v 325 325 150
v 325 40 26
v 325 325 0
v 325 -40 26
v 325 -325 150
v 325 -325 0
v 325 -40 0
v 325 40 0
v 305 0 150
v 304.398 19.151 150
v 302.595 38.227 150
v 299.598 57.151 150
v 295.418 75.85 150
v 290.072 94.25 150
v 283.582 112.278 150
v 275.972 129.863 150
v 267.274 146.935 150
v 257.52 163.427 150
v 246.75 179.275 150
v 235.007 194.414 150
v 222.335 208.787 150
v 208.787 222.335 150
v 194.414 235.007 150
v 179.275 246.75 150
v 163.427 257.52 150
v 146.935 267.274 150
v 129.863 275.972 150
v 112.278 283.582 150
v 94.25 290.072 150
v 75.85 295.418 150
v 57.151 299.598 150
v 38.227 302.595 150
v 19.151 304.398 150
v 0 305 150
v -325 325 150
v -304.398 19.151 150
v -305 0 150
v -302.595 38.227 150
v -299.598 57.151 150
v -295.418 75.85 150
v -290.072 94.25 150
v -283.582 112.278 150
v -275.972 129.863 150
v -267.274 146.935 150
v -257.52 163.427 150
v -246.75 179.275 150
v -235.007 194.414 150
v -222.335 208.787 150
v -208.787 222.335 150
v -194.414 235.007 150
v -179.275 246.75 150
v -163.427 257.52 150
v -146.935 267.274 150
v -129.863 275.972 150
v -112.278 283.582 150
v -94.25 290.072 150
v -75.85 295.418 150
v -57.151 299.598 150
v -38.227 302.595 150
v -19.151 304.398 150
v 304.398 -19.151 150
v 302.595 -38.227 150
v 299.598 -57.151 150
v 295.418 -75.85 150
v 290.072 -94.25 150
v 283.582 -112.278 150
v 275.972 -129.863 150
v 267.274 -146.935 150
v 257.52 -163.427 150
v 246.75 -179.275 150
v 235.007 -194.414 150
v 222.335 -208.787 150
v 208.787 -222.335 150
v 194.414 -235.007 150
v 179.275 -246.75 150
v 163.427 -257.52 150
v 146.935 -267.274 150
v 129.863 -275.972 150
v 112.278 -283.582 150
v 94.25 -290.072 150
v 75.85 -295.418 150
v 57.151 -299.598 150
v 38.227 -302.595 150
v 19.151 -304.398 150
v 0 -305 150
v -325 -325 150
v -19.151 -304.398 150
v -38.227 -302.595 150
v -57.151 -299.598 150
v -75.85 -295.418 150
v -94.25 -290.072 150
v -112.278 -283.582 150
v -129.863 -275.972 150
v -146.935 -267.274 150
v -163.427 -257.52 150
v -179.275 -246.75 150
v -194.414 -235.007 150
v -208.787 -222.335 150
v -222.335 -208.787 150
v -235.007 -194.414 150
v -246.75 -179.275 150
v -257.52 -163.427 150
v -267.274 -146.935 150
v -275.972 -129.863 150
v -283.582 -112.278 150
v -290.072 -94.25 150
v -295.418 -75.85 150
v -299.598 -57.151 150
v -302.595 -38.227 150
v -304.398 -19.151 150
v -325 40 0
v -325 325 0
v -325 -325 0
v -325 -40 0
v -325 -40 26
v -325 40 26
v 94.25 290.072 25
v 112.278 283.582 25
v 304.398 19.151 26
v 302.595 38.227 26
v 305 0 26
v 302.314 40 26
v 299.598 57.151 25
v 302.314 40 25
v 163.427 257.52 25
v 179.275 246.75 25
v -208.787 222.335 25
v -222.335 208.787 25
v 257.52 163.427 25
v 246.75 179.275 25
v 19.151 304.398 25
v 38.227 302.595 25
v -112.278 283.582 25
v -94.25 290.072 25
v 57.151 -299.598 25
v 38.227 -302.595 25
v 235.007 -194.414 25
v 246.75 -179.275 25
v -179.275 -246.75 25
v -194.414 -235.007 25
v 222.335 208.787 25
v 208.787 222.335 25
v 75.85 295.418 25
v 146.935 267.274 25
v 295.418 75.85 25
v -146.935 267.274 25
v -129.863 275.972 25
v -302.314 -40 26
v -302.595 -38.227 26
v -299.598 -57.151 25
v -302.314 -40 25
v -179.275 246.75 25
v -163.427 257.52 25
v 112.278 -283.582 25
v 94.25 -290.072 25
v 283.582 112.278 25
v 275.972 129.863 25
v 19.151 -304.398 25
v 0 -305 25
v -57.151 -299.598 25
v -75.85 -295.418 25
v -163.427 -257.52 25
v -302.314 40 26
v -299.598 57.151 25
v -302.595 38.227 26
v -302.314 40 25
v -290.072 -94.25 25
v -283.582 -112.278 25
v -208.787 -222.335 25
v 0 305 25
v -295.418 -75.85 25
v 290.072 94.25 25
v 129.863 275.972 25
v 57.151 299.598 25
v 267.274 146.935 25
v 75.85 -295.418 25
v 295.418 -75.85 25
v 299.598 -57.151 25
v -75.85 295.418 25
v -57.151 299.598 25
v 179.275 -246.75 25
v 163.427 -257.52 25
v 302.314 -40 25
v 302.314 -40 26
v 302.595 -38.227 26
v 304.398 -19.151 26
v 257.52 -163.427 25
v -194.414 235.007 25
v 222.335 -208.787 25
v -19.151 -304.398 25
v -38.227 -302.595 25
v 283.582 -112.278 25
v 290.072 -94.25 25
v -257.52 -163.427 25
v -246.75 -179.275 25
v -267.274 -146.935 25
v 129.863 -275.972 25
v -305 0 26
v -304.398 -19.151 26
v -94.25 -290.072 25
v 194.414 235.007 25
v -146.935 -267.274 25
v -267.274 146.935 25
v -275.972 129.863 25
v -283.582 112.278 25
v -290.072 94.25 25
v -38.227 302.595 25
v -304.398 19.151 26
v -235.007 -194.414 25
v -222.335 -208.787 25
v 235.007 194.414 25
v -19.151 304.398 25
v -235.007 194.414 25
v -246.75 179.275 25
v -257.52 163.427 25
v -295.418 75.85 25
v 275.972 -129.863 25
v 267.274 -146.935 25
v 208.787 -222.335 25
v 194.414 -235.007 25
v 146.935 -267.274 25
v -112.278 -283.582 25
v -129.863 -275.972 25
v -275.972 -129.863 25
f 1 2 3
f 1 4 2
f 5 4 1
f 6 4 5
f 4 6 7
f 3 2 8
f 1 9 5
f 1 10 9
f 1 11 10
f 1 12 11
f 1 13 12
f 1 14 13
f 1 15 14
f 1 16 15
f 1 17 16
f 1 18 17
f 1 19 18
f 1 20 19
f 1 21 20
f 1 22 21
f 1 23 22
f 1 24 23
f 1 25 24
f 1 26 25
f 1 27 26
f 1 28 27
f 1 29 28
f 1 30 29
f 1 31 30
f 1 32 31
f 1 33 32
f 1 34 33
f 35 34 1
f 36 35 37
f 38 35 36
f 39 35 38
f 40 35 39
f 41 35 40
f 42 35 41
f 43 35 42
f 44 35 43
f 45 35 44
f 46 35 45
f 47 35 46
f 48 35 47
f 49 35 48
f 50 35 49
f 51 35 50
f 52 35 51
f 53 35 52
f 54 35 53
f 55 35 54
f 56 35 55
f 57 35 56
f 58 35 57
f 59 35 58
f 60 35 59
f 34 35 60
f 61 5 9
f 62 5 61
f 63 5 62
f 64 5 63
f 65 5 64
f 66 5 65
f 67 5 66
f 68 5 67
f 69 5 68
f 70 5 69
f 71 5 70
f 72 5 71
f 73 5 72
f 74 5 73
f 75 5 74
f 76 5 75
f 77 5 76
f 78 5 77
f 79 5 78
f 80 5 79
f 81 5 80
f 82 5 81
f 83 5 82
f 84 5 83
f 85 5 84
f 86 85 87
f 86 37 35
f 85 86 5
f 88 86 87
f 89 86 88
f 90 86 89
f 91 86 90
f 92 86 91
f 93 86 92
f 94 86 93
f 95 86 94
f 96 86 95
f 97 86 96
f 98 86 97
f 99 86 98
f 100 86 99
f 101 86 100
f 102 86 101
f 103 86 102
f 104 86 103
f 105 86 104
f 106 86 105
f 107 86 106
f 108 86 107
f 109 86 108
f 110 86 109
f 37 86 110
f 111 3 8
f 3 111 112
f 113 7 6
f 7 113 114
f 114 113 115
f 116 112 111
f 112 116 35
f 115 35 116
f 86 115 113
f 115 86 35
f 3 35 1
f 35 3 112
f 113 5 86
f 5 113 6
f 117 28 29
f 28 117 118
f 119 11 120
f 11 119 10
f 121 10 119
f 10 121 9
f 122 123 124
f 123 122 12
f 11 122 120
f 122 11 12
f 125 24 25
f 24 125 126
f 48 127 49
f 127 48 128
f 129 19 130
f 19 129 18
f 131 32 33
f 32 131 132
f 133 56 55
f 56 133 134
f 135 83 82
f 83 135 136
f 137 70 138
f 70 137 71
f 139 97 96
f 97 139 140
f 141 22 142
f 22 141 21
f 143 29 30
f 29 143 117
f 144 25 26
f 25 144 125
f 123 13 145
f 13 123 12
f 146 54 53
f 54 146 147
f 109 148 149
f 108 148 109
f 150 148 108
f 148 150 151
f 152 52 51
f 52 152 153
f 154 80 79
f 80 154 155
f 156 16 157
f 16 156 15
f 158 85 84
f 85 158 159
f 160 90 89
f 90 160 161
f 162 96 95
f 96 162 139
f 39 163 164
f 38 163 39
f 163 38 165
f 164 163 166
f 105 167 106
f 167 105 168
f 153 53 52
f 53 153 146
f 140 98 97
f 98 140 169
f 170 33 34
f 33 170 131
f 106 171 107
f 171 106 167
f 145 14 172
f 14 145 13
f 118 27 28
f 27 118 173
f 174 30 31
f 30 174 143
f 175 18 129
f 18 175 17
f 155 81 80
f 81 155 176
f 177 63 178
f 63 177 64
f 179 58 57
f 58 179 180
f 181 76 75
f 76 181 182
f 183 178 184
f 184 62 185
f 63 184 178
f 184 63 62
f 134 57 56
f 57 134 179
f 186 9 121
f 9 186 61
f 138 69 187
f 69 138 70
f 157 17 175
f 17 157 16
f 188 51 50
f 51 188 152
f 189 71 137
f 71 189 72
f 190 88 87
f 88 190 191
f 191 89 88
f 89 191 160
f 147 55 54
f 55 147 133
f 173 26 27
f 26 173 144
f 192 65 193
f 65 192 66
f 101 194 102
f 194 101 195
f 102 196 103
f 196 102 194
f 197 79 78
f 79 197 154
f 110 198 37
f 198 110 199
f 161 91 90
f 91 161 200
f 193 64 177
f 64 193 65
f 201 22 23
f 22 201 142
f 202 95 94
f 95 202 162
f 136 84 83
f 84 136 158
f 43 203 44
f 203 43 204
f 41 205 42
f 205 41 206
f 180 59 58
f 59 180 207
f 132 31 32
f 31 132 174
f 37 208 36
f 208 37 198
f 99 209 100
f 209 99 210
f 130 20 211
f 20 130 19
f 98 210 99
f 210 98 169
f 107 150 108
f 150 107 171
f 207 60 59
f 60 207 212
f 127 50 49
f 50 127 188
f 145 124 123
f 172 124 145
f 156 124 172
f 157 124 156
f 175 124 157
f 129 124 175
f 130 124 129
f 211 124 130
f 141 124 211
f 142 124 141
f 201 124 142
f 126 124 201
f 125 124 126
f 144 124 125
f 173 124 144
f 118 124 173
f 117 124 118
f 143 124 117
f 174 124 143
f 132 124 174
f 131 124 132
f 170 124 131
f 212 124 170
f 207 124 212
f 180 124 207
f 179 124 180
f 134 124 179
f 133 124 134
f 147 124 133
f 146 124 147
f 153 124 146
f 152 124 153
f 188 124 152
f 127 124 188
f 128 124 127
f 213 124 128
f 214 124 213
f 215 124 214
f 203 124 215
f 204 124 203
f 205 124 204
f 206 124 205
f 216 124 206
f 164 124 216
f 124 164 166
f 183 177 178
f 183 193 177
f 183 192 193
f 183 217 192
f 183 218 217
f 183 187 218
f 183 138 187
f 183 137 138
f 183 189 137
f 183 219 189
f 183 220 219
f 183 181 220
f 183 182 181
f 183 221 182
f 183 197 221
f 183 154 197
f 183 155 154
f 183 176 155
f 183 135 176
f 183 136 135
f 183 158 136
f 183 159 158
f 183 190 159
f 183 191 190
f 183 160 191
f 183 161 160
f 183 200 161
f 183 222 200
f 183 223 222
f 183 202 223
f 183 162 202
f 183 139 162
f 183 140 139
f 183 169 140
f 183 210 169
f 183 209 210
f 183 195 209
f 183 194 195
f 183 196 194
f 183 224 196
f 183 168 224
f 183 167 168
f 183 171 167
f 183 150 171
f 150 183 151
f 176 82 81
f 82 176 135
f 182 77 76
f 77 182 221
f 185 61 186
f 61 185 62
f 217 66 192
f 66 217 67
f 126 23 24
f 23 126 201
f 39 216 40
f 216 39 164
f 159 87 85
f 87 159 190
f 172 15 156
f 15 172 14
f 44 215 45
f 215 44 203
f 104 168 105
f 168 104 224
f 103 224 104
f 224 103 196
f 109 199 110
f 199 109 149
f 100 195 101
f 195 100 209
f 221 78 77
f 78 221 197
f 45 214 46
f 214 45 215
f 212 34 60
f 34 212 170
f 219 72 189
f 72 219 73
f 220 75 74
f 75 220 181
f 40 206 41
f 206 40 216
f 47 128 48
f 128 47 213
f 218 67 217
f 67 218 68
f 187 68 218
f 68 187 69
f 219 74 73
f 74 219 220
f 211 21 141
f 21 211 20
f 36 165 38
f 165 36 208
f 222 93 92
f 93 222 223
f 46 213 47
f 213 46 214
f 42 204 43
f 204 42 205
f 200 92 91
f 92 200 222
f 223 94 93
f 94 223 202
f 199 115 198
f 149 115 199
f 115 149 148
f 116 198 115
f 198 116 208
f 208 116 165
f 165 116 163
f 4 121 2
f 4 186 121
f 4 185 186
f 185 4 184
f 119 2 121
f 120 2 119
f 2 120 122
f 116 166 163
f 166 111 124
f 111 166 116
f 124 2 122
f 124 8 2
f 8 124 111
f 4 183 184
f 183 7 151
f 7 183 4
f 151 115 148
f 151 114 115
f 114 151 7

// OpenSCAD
// romulan_cargo_stabilizer.scad
// OpenSCAD Parametric Script for Anti-Wobble Transport System

$fn = 100;

// Set parameter to true to render the square sabot; false to render the ramp guide track
render_sabot = true; 

barrel_radius = 300;      // 600mm diameter barrel
sabot_wall = 25;          // Heavy protective outer wall
sabot_height = 150;       // Structural pocket depth
guide_rail_width = 700;   // Outer width of the ramp board path
clearance = 5;            // Structural tolerances

if (render_sabot) {
    target_square_sabot();
} else {
    ramp_guide_board_channel();
}

module target_square_sabot() {
    difference() {
        // Main Square Body (The Tetris Block Footprint)
        size = (barrel_radius * 2) + (sabot_wall * 2);
        translate([-size/2, -size/2, 0])
            cube([size, size, sabot_height]);
        
        // Cylindrical cutout for the industrial barrel
        translate([0, 0, sabot_wall])
            cylinder(r=barrel_radius + clearance, h=sabot_height);
            
        // Lower tracking channels to lock into the tape track and prevent spinning
        translate([-size/2 - 1, -40, -1])
            cube([size + 2, 80, sabot_wall + 2]);
    }
}

module ramp_guide_board_channel() {
    difference() {
        // Base board backing
        translate([-guide_rail_width/2, -500, 0])
            cube([guide_rail_width, 1000, 40]);
            
        // Center channel cutout where the Eddy-Tape lays flush
        translate([-150, -501, 20])
            cube([300, 1002, 25]);
            
        // Left and Right safety interlock slots to capture the sabot base edges
        translate([-(guide_rail_width/2 - 20), -501, 15])
            cube([50, 1002, 30]);
        translate([(guide_rail_width/2 - 70), -501, 15])
            cube([50, 1002, 30]);
    }
}
